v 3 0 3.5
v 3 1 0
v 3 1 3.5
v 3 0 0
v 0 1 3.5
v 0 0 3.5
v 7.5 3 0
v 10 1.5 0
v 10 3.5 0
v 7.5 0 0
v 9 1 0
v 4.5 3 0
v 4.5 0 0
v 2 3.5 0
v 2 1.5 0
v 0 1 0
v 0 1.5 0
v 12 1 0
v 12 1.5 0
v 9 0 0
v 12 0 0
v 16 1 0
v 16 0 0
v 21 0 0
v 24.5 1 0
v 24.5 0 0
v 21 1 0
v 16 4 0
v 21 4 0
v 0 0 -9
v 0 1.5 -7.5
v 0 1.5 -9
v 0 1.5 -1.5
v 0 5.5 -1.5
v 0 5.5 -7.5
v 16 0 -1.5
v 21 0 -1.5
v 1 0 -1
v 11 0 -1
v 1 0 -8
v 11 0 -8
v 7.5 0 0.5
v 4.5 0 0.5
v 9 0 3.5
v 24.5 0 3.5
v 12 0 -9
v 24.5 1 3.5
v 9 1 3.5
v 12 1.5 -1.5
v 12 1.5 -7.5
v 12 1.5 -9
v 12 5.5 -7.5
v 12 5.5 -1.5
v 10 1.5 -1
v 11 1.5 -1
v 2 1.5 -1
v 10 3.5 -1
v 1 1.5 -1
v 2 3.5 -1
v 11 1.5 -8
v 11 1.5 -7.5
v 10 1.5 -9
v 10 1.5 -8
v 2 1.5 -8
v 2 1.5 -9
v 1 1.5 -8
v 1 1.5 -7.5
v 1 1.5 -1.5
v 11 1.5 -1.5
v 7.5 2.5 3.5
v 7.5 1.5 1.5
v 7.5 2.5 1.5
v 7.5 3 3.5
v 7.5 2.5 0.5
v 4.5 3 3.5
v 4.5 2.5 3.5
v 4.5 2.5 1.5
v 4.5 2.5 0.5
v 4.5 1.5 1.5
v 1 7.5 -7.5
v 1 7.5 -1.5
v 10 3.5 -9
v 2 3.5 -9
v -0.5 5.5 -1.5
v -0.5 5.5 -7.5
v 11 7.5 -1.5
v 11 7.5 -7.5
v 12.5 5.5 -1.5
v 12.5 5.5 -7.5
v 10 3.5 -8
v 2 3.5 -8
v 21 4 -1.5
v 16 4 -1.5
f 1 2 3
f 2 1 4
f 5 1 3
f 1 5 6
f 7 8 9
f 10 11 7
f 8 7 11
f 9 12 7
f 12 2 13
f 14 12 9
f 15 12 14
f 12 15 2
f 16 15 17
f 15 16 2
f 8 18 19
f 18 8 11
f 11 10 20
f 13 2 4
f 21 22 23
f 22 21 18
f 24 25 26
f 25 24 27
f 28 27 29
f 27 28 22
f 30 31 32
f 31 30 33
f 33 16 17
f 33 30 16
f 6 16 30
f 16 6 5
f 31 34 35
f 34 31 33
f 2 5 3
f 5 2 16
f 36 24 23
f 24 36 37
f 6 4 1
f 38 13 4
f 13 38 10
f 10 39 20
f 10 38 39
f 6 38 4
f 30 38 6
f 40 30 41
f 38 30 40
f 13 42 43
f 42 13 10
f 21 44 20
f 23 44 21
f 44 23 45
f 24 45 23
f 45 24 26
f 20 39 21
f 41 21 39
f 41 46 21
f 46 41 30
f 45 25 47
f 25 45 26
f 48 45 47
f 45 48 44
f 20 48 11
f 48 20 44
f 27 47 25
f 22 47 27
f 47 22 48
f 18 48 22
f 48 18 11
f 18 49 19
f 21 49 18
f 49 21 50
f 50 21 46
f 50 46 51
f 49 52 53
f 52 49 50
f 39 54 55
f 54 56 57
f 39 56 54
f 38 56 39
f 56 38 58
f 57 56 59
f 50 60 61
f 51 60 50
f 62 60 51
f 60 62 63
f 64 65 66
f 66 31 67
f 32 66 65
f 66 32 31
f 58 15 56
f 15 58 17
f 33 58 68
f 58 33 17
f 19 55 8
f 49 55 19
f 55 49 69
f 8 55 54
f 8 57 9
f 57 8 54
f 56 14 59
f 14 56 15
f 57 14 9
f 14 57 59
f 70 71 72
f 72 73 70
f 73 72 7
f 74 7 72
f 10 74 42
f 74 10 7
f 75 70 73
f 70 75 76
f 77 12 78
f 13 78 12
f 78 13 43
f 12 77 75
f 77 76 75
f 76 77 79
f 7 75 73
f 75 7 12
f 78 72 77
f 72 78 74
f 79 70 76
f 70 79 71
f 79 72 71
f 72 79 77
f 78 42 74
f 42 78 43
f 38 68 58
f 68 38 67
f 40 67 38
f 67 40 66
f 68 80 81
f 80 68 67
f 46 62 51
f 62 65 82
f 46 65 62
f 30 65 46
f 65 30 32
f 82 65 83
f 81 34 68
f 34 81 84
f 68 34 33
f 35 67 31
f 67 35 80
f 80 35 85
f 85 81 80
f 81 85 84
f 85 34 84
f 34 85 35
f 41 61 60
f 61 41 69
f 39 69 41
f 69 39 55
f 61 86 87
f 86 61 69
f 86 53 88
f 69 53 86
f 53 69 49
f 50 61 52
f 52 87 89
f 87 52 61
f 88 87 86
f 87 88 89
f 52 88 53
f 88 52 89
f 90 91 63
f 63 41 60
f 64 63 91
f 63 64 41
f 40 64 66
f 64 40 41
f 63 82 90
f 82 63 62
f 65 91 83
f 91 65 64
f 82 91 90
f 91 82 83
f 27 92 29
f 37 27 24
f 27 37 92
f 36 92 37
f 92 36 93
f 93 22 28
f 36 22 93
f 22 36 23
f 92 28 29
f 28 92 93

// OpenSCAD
cube([3,1,3.5]);

translate([9,0,0]) cube([15.5,1,3.5]);

translate([0,0,-1]) cube([12,1.5,1]);

translate([2,0,-1]) cube([8,3.5,1]);

translate([4.5,2.5,0]) cube([3,0.5,3.5]);


module prism(l, w, h) {
    polyhedron(
           points=[[0,0,0], [l,0,0], [l,w,0], [0,w,0], [0,w,h], [l,w,h]],
           faces=[[0,1,2,3],[5,4,3,2],[0,4,5,1],[0,3,4],[5,2,1]]
    );
    z = 0.08;
    separation = 2;
    border = .2;
}

translate([7.5,2.5,3.5]) rotate([90,180,00]) prism(3, 2, 1);

translate([4.5,0,0]) cube([3,3,0.5]);

translate([0,0,-9]) cube([1,1.5,8]);

translate([0,0,-7.5]) cube([1,6,6]);

translate([1,7.5,-1.5]) rotate([180,90,0]) prism(6, 2, 1.5);

translate([11,0,-9]) cube([1,1.5,8]);

translate([11,0,-7.5]) cube([1,6,6]);

translate([12.5,5.5,-1.5]) rotate([0,90,90]) prism(6, 1.5, 2);

translate([0,0,-9]) cube([12,1.5,1]);

translate([2,0,-9]) cube([8,3.5,1]);

translate([16,0,-1.5]) cube([5,4,1.5]);
